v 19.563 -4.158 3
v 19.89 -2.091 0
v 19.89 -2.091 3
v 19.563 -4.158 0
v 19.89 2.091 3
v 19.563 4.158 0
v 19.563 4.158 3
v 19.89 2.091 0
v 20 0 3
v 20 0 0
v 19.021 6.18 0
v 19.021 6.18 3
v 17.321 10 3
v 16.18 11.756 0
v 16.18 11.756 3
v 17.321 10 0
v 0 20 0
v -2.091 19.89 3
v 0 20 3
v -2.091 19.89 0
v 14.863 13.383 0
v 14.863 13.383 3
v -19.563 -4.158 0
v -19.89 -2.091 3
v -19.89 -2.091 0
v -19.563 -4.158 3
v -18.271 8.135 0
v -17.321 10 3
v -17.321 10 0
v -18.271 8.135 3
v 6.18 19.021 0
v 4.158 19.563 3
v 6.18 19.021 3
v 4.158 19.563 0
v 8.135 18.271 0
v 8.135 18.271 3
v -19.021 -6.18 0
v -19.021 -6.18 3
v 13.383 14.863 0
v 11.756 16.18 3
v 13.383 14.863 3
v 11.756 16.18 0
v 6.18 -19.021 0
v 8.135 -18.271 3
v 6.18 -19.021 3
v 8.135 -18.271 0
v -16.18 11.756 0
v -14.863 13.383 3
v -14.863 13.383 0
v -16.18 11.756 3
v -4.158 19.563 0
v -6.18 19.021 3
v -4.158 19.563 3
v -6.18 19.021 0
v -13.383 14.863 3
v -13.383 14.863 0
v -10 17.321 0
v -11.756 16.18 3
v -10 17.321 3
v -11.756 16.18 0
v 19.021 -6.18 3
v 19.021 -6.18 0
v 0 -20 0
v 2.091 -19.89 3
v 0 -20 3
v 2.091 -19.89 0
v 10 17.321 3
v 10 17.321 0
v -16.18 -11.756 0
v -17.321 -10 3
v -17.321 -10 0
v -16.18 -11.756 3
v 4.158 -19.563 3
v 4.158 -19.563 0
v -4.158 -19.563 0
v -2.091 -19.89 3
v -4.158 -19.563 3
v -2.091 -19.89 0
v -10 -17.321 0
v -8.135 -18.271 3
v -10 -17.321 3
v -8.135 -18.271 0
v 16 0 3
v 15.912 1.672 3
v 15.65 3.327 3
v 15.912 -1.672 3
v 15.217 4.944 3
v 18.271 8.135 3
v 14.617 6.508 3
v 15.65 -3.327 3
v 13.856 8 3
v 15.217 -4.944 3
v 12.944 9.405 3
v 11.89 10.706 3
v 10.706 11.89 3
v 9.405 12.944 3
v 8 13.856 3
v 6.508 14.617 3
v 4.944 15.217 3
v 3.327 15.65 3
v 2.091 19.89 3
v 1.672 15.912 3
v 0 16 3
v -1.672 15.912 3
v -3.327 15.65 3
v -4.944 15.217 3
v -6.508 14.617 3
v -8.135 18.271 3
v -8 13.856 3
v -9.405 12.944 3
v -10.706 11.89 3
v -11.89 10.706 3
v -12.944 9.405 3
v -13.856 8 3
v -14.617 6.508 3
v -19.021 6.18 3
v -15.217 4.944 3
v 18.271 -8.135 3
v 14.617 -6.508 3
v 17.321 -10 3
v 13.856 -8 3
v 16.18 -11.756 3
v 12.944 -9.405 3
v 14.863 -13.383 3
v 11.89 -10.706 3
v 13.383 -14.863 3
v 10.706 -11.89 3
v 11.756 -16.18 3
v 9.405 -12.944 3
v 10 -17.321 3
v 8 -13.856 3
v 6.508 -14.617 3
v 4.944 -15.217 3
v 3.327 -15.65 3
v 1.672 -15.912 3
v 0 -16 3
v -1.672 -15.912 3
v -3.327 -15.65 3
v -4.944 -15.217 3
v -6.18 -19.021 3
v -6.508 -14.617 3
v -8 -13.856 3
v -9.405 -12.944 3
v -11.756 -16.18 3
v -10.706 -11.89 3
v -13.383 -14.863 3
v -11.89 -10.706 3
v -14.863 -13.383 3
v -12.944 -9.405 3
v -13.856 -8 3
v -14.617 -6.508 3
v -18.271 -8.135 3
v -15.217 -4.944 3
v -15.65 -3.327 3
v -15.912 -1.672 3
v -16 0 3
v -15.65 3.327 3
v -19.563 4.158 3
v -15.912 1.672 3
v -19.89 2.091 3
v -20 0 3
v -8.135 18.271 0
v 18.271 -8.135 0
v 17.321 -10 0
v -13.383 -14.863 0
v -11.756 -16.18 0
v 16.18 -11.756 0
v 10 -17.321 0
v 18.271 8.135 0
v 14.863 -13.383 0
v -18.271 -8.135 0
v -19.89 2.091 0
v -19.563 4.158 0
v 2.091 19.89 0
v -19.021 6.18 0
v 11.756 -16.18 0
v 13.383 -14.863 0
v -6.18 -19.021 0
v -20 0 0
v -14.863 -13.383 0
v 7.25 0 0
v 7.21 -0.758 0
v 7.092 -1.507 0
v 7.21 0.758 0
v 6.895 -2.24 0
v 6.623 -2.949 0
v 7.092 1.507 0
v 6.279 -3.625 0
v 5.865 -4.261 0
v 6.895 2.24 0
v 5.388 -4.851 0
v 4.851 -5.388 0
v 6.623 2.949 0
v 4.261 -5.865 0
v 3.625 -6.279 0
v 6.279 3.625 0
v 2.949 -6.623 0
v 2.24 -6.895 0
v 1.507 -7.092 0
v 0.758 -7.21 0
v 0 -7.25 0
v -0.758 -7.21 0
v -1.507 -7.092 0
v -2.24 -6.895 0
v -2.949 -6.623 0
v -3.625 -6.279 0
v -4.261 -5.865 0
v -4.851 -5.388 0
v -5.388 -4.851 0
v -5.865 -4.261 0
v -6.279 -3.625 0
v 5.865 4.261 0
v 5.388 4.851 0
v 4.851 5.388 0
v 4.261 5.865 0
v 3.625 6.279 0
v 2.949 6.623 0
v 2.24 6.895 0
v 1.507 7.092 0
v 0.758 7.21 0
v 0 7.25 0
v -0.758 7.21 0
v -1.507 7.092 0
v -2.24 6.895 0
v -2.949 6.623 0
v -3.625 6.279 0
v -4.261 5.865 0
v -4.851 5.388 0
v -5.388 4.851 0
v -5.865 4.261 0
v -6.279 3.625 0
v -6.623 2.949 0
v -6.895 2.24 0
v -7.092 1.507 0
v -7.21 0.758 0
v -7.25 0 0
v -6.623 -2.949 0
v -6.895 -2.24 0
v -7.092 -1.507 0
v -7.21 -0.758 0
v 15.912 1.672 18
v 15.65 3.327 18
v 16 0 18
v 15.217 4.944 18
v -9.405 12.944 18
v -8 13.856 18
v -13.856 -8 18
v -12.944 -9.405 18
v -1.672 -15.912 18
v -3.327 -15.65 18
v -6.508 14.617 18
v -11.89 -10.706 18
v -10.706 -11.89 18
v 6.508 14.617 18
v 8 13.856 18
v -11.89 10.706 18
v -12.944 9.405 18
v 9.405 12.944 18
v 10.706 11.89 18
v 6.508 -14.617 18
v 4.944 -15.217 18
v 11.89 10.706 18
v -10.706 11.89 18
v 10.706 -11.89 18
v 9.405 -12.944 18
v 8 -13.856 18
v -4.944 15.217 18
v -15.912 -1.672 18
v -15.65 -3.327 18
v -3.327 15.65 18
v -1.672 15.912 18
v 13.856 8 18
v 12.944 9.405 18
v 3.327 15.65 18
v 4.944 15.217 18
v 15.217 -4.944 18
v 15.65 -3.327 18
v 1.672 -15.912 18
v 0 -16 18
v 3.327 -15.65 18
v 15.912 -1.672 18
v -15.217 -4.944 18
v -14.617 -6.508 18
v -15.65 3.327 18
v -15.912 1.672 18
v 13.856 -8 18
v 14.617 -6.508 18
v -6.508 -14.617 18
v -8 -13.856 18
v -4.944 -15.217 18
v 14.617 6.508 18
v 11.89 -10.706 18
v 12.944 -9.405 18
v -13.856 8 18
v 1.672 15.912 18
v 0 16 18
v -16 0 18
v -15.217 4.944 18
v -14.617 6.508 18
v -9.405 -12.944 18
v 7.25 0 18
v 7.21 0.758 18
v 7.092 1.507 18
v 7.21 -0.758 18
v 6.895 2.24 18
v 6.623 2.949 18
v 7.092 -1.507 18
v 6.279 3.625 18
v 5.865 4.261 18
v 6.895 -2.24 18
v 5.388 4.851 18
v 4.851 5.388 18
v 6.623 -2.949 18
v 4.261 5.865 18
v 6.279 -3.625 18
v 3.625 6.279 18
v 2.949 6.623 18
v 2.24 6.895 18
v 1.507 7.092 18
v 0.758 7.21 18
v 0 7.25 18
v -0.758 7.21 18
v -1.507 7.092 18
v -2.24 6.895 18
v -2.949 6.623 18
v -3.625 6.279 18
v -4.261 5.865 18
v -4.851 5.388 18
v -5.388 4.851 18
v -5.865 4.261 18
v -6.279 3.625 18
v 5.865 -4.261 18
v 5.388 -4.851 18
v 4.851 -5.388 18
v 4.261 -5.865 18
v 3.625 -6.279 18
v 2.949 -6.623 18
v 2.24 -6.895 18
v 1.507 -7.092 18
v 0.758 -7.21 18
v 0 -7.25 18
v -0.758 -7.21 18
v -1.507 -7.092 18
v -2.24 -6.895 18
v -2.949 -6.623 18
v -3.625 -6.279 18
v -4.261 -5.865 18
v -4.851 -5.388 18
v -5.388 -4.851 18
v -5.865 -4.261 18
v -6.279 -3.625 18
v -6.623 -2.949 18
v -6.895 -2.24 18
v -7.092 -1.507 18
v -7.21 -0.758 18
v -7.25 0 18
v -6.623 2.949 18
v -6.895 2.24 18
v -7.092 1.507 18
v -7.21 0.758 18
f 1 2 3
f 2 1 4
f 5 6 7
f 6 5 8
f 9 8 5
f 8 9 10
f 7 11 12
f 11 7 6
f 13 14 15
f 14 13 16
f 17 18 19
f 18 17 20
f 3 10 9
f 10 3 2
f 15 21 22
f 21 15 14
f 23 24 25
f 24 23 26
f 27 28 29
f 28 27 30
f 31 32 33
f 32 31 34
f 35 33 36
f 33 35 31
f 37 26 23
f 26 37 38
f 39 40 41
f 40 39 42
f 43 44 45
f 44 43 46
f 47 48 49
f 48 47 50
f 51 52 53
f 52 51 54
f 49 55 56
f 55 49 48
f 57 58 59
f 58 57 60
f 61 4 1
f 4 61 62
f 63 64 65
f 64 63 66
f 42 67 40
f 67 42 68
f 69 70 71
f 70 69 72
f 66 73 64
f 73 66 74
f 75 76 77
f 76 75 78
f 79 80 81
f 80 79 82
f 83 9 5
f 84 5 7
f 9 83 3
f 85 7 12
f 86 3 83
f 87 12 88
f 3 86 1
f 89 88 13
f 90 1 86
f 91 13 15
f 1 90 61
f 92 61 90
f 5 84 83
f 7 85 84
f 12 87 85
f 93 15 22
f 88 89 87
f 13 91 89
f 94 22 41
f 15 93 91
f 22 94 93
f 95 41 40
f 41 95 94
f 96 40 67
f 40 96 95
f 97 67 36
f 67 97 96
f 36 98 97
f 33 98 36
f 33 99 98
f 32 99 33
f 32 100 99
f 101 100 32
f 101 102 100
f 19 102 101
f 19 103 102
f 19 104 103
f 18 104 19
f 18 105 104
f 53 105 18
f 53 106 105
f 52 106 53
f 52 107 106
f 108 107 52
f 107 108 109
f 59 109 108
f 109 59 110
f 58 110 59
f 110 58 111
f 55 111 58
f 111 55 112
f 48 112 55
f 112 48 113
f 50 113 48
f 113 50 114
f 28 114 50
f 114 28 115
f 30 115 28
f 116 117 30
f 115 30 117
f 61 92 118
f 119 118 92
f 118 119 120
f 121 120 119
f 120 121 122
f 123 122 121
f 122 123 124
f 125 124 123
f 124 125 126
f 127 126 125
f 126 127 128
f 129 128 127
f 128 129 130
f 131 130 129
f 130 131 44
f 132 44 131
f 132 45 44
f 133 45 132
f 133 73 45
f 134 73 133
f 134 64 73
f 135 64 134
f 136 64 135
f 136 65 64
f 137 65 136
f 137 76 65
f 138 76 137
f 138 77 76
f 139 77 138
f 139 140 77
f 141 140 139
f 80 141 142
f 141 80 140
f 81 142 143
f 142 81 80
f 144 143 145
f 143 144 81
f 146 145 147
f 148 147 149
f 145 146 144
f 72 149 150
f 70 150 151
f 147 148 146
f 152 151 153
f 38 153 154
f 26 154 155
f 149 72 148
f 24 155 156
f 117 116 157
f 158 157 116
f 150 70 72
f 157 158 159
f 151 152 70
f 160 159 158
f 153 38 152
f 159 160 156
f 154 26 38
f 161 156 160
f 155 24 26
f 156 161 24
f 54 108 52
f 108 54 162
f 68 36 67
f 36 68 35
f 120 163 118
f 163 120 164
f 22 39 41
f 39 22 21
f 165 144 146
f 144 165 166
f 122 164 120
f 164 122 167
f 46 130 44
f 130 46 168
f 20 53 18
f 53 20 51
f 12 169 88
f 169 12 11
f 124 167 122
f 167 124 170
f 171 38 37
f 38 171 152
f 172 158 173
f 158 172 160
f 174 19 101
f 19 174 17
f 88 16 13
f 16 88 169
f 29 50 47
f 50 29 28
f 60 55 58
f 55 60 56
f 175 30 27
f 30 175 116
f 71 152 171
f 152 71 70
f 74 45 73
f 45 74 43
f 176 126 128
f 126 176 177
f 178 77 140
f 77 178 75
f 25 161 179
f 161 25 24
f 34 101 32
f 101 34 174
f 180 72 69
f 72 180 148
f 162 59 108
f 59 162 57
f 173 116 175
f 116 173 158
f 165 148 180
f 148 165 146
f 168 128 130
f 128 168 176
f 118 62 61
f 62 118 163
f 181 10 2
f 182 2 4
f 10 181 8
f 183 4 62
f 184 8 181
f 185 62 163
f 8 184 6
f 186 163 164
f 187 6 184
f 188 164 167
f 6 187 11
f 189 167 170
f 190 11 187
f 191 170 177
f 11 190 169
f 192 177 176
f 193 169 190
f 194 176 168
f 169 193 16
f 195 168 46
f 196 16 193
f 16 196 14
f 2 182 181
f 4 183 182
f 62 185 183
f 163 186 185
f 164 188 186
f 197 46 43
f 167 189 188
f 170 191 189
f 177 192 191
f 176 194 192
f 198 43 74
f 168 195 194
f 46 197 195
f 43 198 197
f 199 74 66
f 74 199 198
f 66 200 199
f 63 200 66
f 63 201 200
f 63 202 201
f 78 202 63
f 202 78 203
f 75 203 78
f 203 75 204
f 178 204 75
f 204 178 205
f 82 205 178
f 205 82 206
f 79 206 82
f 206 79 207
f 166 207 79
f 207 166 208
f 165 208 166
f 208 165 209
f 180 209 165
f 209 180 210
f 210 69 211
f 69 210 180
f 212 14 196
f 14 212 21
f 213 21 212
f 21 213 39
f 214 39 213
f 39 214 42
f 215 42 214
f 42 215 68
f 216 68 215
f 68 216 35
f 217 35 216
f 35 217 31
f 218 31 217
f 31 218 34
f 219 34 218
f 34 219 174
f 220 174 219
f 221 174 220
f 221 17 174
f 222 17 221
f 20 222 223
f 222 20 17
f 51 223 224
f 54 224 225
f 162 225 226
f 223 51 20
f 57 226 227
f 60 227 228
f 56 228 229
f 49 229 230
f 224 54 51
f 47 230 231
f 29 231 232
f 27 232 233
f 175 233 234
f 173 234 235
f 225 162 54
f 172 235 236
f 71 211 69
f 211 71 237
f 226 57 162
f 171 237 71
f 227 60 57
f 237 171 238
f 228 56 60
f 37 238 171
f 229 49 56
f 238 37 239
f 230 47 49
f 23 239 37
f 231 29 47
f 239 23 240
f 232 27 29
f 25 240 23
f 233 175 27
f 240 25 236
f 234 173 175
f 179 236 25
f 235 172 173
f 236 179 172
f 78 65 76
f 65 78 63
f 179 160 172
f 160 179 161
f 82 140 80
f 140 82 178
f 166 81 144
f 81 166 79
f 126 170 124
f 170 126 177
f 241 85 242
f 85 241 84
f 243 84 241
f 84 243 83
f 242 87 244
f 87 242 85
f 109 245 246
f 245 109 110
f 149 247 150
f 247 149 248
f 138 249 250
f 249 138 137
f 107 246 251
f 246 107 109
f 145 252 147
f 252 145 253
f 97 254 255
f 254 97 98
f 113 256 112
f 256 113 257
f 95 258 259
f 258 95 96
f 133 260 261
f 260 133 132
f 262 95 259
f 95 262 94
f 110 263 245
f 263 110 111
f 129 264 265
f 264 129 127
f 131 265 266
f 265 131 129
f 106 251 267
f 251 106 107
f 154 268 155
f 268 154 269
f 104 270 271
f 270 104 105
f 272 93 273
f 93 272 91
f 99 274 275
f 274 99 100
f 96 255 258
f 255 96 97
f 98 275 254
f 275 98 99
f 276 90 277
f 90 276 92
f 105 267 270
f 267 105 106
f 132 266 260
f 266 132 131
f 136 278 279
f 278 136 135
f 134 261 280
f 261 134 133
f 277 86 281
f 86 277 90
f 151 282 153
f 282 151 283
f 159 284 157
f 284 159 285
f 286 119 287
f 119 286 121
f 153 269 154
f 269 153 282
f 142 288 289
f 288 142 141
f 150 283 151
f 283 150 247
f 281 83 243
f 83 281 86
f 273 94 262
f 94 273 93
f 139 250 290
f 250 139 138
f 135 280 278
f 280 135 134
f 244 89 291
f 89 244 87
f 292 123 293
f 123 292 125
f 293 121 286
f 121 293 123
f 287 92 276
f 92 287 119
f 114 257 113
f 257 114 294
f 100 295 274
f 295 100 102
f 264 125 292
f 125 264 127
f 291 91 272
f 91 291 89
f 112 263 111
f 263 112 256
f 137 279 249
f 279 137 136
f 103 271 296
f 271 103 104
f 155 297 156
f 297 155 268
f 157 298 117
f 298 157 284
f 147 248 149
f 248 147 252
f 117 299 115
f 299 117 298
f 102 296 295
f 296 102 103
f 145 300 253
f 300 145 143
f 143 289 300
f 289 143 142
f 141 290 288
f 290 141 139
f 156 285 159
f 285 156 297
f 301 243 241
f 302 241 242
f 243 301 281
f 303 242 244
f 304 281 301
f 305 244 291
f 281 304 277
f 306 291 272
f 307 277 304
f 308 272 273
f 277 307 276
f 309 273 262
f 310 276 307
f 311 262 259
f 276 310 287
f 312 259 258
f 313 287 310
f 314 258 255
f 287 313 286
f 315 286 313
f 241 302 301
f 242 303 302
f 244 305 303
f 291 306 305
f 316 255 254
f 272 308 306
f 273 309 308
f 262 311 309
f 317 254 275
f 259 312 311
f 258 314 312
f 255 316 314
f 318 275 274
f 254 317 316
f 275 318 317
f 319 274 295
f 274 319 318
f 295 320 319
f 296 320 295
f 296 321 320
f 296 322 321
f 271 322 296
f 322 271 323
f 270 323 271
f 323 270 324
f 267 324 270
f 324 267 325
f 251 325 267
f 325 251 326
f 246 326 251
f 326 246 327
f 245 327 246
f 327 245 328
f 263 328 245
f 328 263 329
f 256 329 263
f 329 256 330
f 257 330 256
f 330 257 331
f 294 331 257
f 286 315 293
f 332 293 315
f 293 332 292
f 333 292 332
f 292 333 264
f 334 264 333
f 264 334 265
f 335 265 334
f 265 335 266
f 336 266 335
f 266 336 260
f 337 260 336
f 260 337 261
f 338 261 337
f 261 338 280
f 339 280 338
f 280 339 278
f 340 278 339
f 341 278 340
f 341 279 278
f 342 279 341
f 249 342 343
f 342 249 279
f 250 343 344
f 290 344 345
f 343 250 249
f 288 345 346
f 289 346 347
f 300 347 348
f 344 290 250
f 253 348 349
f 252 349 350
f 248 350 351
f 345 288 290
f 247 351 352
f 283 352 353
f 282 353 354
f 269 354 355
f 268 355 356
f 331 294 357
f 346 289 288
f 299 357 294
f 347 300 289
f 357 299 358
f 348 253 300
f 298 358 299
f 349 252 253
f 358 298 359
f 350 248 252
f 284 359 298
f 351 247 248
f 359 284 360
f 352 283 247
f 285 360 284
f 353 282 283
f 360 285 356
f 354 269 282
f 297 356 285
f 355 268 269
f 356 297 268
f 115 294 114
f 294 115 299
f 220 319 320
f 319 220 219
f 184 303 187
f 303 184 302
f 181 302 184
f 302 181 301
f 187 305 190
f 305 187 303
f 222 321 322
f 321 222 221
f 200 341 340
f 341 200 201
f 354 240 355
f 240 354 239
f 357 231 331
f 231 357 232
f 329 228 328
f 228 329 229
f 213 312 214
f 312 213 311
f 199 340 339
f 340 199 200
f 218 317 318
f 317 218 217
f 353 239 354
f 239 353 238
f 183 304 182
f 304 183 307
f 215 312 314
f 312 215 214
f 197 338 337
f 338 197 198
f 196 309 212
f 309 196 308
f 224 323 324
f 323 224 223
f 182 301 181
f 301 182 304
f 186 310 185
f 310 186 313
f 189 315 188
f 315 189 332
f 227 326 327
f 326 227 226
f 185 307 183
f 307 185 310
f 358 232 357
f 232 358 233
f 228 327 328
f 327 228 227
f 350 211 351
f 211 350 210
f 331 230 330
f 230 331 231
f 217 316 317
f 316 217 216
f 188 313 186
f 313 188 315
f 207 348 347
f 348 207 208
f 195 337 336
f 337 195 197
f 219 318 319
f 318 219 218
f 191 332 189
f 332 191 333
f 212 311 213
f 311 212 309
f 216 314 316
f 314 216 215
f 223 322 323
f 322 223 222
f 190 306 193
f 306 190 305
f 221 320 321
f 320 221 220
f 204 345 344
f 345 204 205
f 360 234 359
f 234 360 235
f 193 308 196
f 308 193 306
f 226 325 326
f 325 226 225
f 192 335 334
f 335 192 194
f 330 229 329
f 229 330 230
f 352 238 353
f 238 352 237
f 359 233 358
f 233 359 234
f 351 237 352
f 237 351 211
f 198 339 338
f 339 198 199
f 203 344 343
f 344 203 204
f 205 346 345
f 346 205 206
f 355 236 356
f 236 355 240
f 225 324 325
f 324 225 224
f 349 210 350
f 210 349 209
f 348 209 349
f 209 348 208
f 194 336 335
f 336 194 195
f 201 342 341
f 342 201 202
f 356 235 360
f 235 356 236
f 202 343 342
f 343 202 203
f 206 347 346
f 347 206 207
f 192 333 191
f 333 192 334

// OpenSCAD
// Cable gland body for 14 mm cable.
$fn = 60;
eps = 0.02;
cable_d = 14;
body_d = 32;
body_l = 18;
flange_d = body_d + 8;
flange_t = 3;
difference() {
    union() { cylinder(d = flange_d, h = flange_t); cylinder(d = body_d, h = body_l); }
    translate([0, 0, -eps]) cylinder(d = cable_d + 0.5, h = body_l + 2 * eps);
}
